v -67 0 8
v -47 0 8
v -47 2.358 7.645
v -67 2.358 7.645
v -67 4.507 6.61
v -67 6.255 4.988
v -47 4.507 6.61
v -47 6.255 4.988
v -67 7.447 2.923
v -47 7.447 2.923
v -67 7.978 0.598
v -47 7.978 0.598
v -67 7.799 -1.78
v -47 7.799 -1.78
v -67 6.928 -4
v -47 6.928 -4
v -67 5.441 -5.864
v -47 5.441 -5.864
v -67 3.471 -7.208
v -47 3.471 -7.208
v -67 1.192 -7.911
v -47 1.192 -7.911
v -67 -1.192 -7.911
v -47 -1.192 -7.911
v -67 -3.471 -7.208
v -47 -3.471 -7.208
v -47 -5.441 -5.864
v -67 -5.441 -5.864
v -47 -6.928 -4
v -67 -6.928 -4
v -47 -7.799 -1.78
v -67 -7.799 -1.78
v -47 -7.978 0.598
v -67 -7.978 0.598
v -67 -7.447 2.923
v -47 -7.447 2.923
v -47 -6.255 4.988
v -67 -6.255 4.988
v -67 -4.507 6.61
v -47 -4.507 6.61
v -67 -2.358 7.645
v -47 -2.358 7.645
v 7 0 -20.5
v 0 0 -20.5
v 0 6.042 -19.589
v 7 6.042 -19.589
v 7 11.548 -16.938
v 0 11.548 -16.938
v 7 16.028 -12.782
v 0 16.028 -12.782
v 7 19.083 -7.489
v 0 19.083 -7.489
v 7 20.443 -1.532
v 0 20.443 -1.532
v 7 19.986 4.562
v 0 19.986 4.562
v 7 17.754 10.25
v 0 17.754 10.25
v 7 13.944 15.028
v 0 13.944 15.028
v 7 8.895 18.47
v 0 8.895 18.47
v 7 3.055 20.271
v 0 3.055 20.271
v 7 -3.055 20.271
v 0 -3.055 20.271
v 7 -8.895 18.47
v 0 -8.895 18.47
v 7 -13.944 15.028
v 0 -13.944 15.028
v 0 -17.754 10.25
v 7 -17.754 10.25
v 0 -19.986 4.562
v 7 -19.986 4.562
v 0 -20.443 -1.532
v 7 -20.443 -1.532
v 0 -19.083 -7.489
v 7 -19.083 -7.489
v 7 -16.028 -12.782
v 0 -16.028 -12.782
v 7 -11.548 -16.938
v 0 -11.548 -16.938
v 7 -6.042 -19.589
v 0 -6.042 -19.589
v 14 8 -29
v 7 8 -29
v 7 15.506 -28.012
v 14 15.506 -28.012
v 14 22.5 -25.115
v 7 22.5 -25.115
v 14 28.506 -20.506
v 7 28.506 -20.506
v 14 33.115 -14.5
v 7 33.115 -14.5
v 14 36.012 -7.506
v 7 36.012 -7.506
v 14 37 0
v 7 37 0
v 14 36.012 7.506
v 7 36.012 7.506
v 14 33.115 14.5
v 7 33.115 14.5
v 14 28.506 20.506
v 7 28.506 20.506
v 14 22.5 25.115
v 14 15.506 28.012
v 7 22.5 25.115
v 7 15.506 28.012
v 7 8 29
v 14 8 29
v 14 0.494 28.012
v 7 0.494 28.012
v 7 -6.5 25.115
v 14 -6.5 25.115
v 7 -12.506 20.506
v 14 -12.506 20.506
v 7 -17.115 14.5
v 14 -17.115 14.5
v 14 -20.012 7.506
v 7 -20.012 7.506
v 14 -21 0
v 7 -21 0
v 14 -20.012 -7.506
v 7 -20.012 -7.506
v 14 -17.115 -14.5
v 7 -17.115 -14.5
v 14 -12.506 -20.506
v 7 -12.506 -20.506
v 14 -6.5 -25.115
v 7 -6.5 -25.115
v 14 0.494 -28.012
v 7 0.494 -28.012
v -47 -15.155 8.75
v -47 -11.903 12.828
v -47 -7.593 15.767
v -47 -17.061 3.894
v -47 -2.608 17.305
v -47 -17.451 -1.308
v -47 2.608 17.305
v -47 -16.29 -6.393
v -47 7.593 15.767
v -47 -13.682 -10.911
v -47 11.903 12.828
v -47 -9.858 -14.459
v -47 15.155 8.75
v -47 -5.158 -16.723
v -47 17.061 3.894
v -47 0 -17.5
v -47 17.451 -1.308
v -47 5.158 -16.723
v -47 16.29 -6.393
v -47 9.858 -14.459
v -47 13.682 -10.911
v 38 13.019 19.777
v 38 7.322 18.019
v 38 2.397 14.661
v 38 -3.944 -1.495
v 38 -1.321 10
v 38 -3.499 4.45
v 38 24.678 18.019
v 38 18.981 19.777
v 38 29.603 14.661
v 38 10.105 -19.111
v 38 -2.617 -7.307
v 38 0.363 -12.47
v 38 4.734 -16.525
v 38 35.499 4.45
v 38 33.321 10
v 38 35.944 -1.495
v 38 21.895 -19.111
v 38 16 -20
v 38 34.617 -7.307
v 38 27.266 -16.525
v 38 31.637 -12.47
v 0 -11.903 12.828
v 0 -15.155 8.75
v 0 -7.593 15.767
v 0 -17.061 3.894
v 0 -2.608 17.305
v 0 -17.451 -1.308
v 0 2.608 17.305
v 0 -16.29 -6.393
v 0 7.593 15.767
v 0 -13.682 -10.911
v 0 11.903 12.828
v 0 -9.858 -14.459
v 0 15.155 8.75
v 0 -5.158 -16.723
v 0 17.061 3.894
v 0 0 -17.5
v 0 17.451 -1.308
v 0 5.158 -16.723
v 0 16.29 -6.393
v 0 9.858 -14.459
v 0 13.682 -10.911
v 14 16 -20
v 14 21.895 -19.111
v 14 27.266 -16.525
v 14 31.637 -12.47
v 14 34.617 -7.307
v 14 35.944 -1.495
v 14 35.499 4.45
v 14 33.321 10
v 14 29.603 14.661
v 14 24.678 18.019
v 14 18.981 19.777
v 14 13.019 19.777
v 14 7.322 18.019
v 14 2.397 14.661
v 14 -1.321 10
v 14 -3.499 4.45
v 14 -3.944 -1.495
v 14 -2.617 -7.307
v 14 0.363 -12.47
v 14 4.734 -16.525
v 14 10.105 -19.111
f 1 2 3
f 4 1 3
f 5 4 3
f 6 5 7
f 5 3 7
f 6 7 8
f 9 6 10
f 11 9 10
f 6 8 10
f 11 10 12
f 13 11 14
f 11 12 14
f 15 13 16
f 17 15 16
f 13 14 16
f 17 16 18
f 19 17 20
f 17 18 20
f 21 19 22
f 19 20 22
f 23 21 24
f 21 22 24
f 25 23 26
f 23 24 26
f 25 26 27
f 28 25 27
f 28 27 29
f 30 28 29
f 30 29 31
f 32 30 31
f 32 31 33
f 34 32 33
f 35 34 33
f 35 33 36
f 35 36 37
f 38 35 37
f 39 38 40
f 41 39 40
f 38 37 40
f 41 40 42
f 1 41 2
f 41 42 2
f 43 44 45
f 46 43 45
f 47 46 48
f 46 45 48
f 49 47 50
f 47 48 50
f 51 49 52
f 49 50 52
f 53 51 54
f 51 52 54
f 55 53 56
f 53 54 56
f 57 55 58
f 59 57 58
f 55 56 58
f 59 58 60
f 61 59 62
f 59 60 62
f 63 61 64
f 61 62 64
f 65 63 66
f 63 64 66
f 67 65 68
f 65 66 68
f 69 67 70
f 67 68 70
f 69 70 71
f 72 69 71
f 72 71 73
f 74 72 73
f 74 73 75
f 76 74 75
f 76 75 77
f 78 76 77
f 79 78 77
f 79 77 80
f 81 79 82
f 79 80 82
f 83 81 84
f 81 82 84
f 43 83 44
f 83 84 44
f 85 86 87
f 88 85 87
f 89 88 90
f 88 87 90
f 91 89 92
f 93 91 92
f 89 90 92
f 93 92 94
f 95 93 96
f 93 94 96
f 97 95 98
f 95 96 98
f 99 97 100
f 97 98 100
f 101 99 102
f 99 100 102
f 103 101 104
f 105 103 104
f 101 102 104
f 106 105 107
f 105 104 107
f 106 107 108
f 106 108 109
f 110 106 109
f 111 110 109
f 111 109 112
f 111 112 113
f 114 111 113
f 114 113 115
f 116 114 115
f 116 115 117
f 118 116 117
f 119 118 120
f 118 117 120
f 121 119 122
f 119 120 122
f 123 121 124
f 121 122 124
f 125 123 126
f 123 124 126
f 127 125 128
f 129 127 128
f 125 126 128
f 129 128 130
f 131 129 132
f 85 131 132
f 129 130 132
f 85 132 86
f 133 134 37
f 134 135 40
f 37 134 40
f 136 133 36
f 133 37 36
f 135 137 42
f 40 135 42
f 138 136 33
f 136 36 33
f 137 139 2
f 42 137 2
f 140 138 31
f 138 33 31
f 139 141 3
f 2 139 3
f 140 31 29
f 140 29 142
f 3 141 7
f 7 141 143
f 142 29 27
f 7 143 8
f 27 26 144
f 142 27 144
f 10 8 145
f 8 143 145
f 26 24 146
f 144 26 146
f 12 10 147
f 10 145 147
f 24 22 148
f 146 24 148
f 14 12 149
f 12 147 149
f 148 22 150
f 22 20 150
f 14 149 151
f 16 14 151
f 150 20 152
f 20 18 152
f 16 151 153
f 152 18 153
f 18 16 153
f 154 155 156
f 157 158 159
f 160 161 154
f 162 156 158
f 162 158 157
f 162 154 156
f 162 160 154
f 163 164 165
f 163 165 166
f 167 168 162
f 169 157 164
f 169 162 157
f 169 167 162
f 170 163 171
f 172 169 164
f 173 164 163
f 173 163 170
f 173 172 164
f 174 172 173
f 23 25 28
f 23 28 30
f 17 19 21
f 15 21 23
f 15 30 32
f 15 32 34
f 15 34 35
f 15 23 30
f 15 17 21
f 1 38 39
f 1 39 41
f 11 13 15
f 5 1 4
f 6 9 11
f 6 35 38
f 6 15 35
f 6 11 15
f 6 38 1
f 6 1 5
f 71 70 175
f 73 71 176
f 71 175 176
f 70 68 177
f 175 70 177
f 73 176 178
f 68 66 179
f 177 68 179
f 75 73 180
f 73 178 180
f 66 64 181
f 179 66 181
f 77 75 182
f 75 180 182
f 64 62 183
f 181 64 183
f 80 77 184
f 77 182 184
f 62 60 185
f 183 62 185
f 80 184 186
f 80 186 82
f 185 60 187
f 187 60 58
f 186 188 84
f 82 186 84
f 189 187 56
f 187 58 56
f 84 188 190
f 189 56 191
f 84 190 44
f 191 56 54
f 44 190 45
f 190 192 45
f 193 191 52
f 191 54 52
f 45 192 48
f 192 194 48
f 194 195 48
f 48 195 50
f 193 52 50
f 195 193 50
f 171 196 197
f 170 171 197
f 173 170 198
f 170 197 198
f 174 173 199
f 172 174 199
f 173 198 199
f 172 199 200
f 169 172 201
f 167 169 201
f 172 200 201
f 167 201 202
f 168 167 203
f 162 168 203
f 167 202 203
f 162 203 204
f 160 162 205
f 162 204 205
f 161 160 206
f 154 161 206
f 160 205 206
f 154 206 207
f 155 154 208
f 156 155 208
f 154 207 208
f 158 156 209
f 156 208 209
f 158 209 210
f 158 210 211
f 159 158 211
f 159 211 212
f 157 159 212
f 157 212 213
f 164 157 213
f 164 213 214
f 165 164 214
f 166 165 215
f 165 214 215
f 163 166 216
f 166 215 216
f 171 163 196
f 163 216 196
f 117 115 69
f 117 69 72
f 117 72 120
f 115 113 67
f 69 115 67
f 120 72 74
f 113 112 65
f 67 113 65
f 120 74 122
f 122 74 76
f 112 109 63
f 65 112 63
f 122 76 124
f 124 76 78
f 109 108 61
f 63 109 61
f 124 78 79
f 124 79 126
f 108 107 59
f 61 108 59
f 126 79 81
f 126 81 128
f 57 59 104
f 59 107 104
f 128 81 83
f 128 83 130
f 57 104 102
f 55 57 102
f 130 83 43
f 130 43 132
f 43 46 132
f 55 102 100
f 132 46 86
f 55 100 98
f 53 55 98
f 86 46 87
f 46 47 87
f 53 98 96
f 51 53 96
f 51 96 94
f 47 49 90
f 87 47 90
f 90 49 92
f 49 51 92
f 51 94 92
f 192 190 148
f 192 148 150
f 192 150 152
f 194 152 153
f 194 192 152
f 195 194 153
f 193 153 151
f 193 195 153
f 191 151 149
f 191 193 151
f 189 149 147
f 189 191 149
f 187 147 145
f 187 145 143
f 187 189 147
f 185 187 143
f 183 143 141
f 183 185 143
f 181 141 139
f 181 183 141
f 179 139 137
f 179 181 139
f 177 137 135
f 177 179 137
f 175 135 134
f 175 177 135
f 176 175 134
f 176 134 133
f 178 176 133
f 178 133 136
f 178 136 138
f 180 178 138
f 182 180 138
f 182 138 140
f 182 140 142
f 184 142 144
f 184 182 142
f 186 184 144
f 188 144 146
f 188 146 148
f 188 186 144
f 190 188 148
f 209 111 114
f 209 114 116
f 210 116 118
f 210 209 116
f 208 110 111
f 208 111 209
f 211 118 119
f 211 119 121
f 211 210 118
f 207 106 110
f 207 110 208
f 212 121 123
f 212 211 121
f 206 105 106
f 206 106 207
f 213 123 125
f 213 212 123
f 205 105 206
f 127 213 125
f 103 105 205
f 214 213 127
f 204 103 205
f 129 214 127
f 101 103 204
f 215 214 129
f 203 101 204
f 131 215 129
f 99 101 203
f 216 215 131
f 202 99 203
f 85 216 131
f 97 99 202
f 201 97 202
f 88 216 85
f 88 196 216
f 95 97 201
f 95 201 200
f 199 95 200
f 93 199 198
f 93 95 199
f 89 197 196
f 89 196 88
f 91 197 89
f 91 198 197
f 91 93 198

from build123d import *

# Parameters (mm, degrees)
ESQUISSE2_R        = 17.5
BOSS_EXTRU_1_DEPTH = 47
ESQUISSE3_R        = 8
BOSS_EXTRU_2_DEPTH = 20
ESQUISSE4_R        = 20.5
BOSS_EXTRU_3_DEPTH = 7
ESQUISSE5_R        = 29
BOSS_EXTRU_4_DEPTH = 7
ESQUISSE6_R        = 20
BOSS_EXTRU_5_DEPTH = 24


with BuildPart() as part:
    # Esquisse2 → Boss.-Extru.1 (new body)
    with BuildSketch(Plane(origin=(0, 0, 0), x_dir=(0, 0, -1), z_dir=(1, 0, 0))):
        Circle(ESQUISSE2_R)
    extrude(amount=-BOSS_EXTRU_1_DEPTH)

    # Esquisse3 → Boss.-Extru.2 (add)
    with BuildSketch(Plane.ZY.offset(47)):
        Circle(ESQUISSE3_R)
    extrude(amount=BOSS_EXTRU_2_DEPTH)

    # Esquisse4 → Boss.-Extru.3 (add)
    with BuildSketch(Plane(origin=(0, 0, 0), x_dir=(0, 0, -1), z_dir=(1, 0, 0))):
        Circle(ESQUISSE4_R)
    extrude(amount=BOSS_EXTRU_3_DEPTH)

    # Esquisse5 → Boss.-Extru.4 (add)
    with BuildSketch(Plane(origin=(7, 0, 0), x_dir=(0, 0, -1), z_dir=(1, 0, 0))):
        with Locations((0, 8)):
            Circle(ESQUISSE5_R)
    extrude(amount=BOSS_EXTRU_4_DEPTH)

    # Esquisse6 → Boss.-Extru.5 (add)
    with BuildSketch(Plane(origin=(14, 0, 0), x_dir=(0, 0, -1), z_dir=(1, 0, 0))):
        with Locations((0, 16)):
            Circle(ESQUISSE6_R)
    extrude(amount=BOSS_EXTRU_5_DEPTH)


solid = part.part
